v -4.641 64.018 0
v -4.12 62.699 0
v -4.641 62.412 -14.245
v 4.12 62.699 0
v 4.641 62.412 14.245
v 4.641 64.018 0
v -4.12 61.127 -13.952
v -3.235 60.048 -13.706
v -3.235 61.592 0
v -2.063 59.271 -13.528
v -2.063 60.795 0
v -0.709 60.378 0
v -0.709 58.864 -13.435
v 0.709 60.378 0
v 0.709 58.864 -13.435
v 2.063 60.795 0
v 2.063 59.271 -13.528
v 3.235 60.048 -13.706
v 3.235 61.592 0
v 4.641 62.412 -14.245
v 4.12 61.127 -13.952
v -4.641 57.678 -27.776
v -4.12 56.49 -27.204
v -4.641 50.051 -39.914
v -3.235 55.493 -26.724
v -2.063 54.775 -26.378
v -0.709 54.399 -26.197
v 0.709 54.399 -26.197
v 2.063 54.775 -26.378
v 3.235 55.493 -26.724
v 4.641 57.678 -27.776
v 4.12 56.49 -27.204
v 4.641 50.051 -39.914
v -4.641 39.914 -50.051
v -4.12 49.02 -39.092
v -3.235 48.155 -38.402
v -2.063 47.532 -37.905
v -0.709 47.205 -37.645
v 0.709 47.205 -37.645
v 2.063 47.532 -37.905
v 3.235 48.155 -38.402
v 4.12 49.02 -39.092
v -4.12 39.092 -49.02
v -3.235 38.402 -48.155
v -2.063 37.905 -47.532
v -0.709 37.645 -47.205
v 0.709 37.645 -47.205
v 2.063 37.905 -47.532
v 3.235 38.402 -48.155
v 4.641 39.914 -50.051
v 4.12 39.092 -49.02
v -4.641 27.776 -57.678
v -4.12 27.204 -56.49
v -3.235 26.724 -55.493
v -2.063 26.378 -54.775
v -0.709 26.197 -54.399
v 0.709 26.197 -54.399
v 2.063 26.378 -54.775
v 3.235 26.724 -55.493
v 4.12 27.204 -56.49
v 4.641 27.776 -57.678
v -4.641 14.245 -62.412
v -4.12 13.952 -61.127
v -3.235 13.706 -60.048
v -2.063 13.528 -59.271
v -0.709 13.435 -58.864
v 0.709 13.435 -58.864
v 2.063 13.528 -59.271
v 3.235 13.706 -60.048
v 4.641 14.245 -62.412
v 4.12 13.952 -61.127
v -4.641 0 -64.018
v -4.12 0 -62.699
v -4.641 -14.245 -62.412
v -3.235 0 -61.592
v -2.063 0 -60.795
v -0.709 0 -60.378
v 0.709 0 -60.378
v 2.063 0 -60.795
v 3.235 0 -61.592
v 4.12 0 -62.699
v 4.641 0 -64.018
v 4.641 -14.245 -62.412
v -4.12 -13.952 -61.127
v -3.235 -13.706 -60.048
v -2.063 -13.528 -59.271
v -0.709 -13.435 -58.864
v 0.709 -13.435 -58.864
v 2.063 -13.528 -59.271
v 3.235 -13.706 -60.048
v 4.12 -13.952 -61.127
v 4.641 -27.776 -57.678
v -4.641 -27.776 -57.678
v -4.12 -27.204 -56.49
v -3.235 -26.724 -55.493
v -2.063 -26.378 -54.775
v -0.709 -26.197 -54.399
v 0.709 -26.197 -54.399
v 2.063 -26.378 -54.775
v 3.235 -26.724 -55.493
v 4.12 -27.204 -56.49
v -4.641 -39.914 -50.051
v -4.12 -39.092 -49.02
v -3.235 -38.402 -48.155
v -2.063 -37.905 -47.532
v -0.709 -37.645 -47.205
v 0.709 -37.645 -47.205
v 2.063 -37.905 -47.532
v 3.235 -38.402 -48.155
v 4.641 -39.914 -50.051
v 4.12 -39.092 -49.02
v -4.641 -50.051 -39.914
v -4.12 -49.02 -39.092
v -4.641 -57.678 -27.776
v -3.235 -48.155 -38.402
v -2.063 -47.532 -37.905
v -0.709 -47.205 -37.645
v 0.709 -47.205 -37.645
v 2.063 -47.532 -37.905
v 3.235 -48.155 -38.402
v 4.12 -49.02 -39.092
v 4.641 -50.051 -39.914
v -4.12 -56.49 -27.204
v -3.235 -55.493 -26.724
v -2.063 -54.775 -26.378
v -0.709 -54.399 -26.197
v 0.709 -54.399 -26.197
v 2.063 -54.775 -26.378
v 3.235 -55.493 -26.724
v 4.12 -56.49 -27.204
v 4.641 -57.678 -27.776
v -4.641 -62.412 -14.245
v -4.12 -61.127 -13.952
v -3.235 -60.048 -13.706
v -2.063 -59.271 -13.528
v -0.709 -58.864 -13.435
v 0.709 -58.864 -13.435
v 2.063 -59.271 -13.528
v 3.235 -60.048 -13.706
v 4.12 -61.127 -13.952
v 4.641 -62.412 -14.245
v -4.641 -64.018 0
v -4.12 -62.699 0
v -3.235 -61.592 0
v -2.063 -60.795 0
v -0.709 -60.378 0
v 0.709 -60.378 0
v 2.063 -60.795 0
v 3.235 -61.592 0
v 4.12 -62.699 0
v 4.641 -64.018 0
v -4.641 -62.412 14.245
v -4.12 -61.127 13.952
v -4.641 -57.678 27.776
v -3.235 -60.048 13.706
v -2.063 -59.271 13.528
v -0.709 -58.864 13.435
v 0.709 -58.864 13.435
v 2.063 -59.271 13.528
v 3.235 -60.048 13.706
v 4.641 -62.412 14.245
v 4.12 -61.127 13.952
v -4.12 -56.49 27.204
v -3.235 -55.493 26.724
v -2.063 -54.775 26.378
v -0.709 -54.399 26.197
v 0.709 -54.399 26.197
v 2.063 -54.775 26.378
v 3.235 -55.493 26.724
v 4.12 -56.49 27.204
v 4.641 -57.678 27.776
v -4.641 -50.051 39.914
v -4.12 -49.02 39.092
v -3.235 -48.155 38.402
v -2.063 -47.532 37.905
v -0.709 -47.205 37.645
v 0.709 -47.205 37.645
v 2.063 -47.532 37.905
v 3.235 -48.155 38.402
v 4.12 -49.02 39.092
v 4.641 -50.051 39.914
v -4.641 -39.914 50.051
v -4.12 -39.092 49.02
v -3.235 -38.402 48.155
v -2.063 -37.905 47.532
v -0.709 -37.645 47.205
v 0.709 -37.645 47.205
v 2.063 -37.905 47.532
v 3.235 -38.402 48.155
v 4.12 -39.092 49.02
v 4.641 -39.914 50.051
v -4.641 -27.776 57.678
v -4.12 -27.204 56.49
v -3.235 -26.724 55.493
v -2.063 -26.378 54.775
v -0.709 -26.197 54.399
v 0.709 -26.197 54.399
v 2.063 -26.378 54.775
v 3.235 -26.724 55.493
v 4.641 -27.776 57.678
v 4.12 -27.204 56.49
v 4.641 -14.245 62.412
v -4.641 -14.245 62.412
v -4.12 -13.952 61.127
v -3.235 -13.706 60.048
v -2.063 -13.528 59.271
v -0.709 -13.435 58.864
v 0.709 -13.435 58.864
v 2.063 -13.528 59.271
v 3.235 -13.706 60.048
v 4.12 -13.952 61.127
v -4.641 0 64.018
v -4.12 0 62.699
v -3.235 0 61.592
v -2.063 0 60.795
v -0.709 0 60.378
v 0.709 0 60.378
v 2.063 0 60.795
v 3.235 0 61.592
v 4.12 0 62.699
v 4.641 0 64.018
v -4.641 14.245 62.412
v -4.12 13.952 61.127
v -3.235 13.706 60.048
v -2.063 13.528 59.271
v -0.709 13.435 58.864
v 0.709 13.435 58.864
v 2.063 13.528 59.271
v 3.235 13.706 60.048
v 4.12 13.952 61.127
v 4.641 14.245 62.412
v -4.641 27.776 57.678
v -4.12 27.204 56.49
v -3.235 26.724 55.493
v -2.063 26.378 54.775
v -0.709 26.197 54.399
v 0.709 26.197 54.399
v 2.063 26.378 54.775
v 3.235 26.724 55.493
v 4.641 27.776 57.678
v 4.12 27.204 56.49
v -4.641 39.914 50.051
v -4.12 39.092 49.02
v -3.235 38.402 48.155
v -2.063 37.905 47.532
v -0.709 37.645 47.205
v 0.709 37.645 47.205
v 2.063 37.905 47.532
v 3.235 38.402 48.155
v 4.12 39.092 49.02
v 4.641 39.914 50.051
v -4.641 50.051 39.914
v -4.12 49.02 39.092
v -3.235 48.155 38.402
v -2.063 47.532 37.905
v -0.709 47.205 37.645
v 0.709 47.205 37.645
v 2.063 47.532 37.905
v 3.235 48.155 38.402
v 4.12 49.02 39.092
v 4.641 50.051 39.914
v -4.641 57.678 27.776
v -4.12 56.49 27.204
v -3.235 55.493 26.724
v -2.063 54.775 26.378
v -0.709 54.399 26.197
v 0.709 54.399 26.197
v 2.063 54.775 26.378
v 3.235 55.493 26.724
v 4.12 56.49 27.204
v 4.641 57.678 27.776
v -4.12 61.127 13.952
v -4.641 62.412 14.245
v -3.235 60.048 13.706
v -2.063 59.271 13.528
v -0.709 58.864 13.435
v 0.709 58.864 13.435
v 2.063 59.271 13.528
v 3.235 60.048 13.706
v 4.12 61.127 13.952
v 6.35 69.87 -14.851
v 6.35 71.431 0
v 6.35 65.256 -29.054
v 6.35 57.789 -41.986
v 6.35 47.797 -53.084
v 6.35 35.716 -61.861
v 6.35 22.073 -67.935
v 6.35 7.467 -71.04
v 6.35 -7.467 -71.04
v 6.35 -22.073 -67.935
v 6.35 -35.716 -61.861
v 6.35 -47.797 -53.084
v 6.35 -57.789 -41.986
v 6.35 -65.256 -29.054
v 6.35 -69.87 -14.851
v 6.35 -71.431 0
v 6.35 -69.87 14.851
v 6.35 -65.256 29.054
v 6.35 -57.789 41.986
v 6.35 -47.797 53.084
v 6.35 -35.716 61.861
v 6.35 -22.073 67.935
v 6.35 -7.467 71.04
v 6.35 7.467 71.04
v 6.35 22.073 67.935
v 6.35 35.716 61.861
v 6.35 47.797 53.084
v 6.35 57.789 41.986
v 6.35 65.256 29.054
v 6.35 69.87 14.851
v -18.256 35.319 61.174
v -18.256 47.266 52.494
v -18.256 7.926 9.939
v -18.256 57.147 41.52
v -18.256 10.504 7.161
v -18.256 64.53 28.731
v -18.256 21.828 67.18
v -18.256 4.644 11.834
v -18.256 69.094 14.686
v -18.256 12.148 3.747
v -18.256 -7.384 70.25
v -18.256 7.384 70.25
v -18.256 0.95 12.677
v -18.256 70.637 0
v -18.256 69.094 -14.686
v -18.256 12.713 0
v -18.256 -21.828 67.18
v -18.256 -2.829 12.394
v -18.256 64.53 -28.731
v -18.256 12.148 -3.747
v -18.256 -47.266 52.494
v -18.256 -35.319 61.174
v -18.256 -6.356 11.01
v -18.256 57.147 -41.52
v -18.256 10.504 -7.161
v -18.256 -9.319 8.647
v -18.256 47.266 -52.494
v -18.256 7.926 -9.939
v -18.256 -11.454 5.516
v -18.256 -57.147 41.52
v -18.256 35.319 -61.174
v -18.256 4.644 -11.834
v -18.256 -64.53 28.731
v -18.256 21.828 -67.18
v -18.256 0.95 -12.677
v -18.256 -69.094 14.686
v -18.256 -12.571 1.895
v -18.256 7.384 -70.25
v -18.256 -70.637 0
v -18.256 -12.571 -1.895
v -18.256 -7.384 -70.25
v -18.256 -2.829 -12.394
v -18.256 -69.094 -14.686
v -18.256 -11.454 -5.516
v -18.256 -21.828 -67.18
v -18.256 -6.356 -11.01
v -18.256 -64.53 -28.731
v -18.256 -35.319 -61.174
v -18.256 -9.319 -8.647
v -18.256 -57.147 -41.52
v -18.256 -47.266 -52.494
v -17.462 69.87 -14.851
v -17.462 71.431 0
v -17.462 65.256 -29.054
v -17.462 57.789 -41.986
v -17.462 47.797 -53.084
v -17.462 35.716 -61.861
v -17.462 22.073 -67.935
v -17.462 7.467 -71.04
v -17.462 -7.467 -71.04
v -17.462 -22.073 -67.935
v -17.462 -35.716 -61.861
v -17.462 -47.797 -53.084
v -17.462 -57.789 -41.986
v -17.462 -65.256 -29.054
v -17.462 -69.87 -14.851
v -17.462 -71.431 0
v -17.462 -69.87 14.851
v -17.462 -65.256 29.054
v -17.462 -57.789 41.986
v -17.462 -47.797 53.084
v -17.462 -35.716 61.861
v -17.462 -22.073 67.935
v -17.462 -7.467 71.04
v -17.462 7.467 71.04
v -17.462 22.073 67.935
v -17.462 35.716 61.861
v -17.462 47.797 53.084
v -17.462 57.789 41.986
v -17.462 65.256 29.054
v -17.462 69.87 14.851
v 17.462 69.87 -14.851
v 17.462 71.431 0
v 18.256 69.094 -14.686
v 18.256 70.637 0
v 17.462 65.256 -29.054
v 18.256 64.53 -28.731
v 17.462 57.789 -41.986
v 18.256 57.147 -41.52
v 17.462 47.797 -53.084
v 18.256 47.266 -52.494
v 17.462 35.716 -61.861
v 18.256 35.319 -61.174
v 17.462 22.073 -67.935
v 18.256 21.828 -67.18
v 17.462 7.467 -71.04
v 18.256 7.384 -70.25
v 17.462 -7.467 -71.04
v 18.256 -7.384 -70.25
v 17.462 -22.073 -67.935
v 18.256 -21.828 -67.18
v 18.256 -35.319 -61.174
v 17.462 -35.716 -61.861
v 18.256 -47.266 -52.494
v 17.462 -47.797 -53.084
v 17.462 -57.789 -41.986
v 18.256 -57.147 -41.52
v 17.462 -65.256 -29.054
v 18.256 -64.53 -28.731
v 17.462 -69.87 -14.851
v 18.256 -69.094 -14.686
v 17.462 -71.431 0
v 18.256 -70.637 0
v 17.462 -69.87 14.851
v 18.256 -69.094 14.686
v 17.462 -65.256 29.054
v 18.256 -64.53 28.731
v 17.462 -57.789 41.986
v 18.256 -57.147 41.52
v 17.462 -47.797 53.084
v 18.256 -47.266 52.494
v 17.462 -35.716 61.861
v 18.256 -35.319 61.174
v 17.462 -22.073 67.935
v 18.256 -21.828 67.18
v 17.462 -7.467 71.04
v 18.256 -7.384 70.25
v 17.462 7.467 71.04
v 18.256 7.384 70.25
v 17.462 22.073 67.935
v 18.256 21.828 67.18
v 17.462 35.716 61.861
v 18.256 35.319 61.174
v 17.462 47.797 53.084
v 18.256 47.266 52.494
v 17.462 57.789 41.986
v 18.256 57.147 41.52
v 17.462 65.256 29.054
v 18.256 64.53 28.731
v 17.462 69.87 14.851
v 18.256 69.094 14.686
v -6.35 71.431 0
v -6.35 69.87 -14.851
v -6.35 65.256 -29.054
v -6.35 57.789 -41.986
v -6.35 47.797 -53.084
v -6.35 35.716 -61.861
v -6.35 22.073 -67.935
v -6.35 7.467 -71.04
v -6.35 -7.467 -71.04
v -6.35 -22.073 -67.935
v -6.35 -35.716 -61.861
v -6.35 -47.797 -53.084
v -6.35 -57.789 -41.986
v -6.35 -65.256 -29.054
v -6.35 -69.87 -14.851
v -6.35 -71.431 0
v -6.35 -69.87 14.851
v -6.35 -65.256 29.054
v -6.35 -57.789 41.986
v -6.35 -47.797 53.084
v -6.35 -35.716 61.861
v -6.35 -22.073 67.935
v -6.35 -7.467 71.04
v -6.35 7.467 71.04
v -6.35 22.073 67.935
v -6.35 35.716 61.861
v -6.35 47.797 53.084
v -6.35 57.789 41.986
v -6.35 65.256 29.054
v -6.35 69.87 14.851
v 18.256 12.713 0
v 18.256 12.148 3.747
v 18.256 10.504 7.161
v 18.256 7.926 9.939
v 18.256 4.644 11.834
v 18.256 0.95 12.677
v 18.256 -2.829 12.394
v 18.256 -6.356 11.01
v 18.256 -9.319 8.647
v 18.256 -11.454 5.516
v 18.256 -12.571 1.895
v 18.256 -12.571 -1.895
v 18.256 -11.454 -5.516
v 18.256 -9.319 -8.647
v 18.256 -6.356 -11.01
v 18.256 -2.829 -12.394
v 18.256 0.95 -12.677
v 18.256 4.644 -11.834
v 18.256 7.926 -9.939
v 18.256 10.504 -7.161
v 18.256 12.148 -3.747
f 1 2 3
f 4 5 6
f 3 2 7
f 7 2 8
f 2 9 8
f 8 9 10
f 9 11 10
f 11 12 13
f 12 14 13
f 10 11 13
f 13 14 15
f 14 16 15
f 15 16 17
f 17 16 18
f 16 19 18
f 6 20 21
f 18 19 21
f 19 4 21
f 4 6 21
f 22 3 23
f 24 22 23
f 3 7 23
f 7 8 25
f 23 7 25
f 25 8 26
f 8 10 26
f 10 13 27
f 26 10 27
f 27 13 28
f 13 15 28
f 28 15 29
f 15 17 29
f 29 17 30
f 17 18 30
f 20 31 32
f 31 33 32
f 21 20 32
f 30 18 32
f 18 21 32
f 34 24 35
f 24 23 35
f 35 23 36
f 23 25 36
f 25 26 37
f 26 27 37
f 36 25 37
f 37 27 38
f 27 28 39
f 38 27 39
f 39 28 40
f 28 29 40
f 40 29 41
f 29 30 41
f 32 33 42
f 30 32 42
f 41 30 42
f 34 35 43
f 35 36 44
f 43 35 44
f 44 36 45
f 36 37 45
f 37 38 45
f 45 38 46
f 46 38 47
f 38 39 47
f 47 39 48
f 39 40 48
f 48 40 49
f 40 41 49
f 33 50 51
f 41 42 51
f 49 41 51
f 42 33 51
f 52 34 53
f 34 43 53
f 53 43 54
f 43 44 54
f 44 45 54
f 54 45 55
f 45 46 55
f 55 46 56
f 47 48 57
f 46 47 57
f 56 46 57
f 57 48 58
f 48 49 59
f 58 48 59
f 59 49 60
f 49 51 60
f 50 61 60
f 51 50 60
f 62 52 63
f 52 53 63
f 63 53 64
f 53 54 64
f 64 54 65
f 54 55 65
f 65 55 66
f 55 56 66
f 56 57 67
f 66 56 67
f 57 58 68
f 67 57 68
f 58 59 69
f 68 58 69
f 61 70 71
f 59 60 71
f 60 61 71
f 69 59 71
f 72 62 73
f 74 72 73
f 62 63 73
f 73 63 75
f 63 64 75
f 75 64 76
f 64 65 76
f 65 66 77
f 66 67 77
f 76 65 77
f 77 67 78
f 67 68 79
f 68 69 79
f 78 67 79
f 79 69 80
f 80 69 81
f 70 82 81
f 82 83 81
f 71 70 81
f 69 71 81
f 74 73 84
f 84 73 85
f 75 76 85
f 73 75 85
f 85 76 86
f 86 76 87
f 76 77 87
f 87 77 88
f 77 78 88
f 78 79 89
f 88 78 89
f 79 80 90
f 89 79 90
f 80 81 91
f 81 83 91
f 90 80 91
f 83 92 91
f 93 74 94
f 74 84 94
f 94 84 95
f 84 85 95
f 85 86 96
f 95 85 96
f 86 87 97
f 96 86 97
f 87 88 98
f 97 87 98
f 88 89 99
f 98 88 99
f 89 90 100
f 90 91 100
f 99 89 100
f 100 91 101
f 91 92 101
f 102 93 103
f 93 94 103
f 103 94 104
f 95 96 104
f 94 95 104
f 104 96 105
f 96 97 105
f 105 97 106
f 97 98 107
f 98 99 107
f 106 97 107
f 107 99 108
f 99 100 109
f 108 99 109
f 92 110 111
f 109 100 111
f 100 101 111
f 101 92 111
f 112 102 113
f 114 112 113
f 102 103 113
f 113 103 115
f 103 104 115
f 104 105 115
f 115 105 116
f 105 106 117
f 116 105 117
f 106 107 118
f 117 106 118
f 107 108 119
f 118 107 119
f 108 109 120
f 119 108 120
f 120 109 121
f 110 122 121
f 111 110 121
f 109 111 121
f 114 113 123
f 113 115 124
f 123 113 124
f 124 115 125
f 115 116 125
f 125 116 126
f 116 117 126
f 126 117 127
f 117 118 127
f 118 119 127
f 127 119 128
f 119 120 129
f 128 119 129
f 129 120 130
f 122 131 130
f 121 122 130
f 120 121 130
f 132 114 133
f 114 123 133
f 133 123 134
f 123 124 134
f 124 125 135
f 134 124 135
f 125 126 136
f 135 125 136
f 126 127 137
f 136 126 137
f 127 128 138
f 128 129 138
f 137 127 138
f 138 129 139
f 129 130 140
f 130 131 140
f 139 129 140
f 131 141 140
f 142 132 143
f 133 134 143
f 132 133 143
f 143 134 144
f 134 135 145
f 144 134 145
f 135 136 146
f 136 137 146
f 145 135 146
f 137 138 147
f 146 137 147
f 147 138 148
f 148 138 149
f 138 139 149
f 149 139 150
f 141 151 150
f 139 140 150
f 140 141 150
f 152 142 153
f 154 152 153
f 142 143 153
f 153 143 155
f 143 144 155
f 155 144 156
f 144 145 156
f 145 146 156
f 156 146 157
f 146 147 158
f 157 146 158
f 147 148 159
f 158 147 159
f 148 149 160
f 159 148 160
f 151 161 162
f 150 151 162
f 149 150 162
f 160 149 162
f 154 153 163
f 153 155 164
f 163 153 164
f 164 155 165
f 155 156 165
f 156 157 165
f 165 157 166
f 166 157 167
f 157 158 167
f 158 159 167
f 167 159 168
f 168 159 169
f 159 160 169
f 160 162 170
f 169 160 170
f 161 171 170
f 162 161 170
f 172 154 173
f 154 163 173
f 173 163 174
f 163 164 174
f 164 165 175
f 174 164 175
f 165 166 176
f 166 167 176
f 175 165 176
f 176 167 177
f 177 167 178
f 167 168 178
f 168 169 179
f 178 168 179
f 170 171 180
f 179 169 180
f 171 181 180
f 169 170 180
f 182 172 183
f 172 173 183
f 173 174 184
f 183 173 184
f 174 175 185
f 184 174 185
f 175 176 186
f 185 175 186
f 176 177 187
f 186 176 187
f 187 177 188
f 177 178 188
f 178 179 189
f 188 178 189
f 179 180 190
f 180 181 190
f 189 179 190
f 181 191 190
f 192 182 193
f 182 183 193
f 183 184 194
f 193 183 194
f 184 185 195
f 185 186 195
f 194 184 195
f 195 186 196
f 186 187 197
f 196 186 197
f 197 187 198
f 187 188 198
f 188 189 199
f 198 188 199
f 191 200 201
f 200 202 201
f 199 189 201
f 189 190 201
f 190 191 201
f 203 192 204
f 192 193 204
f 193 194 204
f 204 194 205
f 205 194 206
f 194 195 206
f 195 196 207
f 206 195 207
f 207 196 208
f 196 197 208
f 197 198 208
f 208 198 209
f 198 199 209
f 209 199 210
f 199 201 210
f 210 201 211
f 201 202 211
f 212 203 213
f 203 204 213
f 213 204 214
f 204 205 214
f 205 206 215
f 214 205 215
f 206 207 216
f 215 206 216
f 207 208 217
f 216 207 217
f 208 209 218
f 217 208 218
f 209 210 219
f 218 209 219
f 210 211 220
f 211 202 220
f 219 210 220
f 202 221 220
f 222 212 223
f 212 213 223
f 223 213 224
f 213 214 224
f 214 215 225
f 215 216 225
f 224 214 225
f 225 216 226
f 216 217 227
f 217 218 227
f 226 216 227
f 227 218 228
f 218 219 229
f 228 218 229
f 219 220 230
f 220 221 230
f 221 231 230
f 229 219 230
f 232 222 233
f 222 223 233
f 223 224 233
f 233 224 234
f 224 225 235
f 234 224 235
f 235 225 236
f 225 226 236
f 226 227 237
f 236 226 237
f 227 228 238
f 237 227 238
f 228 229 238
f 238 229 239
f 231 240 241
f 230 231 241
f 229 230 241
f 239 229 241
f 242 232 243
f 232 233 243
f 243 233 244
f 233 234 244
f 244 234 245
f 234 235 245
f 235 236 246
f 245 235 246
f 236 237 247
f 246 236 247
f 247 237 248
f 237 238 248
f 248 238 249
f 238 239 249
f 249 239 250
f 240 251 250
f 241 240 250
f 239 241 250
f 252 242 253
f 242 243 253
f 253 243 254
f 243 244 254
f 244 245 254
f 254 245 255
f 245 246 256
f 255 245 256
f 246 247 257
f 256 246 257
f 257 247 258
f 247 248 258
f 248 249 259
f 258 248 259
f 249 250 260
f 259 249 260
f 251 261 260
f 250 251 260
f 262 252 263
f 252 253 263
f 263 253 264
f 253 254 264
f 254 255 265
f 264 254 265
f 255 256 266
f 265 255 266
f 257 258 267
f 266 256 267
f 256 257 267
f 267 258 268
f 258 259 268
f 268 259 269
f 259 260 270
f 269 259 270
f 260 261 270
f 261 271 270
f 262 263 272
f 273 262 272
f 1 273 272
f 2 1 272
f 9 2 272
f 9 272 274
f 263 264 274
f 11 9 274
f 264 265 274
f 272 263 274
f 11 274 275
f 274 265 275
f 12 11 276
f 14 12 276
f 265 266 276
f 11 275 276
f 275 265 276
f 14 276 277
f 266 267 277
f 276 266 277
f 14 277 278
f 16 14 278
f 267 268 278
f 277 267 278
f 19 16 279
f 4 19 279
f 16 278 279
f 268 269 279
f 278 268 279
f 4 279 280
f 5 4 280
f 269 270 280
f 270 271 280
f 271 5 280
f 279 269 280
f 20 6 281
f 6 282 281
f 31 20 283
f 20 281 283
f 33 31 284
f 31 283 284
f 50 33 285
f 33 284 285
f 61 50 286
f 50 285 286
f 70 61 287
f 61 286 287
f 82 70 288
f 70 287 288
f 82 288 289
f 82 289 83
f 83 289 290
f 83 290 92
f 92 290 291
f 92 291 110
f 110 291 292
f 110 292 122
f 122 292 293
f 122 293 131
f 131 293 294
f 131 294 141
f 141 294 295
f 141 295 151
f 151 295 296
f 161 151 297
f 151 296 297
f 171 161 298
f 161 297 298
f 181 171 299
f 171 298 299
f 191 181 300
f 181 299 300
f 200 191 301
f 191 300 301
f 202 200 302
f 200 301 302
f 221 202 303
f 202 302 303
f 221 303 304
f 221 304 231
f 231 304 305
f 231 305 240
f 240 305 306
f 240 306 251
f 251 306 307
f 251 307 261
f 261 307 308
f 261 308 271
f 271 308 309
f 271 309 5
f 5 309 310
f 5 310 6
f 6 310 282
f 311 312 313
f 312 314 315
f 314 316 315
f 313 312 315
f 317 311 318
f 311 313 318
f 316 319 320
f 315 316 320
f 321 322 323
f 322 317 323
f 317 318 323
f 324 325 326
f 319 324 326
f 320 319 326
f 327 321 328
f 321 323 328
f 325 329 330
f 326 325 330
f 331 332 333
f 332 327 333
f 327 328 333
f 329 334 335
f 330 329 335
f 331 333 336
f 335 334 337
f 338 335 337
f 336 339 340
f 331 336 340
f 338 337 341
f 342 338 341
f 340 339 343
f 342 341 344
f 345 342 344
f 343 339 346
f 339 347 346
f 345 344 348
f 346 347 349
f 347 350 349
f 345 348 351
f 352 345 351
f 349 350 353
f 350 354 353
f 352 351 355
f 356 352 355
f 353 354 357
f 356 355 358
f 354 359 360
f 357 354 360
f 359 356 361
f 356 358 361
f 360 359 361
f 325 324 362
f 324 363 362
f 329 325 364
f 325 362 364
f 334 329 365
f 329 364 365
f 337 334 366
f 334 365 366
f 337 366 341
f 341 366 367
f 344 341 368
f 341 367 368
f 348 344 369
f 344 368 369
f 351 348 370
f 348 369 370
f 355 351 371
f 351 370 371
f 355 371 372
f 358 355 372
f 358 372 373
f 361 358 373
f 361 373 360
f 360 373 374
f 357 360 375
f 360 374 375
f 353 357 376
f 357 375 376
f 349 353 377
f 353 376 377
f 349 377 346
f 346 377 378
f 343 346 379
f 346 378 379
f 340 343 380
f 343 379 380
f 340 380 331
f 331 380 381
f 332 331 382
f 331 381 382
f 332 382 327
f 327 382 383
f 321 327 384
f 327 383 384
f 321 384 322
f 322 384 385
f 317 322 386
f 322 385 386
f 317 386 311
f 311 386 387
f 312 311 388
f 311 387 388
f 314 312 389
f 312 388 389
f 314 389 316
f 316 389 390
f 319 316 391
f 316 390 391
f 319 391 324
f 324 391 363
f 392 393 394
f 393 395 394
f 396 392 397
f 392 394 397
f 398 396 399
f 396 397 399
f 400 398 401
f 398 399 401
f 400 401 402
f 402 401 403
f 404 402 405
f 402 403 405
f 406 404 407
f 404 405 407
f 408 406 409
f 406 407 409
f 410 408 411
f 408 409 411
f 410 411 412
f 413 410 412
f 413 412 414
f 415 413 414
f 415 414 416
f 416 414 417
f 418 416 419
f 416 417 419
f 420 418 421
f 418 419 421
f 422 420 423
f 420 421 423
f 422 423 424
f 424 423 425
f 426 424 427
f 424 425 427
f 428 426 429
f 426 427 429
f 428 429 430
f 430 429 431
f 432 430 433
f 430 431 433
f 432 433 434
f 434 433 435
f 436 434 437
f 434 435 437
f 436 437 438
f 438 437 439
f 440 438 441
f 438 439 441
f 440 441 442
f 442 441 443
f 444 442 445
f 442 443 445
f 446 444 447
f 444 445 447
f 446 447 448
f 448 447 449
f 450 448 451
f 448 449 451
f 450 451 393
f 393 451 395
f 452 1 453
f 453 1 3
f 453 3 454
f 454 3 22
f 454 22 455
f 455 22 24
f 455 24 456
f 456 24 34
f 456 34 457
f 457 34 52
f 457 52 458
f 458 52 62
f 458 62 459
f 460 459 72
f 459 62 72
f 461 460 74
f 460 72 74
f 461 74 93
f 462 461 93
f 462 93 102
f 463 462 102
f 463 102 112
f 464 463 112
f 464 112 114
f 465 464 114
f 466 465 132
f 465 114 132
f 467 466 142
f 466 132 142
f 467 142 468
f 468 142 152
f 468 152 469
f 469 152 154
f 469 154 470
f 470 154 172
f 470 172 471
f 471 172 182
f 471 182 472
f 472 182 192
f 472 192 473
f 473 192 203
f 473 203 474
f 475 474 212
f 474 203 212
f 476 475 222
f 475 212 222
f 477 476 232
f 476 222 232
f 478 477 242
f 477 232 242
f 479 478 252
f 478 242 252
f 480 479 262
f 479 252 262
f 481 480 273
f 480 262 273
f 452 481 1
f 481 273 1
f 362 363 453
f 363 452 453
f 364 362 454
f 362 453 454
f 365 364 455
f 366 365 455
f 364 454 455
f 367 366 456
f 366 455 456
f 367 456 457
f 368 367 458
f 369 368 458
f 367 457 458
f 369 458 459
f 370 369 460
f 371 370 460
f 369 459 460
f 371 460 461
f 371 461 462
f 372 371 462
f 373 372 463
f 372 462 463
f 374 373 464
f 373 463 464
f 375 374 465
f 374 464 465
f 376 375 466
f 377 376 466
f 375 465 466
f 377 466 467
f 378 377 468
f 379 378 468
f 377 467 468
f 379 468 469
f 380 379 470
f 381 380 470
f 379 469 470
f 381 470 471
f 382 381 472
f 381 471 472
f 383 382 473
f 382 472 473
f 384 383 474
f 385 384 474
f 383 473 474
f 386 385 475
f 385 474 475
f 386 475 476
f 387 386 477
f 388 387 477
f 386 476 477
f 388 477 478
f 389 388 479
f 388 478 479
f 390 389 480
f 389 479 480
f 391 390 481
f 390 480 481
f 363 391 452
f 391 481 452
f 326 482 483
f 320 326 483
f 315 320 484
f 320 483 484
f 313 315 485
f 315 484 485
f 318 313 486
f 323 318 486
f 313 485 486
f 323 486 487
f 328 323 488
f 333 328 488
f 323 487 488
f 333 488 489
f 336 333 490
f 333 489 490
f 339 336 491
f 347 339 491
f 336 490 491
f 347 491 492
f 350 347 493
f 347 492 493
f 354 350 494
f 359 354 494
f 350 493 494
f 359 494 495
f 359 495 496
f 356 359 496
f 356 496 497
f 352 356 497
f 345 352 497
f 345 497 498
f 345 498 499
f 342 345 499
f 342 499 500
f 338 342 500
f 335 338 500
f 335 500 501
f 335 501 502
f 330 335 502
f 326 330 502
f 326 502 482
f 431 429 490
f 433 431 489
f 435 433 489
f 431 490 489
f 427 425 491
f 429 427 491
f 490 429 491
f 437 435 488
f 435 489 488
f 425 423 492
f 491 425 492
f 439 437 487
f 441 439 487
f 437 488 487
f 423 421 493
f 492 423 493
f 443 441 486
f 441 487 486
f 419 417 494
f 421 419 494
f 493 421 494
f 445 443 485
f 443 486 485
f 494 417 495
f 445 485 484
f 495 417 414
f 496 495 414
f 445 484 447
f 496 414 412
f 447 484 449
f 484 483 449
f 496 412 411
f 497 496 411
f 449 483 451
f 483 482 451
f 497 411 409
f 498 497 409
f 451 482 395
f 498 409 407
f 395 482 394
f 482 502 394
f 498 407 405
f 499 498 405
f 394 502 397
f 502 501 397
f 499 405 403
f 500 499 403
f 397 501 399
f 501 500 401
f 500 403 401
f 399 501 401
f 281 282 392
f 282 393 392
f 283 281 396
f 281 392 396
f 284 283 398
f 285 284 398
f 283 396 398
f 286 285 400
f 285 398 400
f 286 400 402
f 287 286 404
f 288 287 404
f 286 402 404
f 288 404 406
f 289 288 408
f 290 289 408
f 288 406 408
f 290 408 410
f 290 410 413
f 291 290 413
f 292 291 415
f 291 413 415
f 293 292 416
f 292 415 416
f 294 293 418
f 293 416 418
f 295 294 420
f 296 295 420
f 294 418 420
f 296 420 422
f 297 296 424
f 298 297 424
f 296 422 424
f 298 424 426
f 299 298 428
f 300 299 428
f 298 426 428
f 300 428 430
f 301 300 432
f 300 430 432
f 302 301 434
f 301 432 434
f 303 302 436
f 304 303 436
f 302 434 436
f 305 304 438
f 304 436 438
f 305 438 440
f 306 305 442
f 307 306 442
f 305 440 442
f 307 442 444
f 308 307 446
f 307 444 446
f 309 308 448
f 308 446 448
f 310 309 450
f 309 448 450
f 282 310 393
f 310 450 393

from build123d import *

# Parameters (mm, degrees)
SKETCH2_R          = 12.7127
CUT_EXTRUDE1_DEPTH = 37.5125


with BuildPart() as part:
    # Sketch1 → Revolve1 (revolve)
    with BuildSketch(Plane.XY):
        with BuildLine():
            Line((18.25625, 0), (-18.25625, 0))
            Line((-18.25625, 0), (-18.25625, 70.6374))
            Line((-18.25625, 70.6374), (-17.4625, 71.43115))
            Line((-17.4625, 71.43115), (-6.35, 71.43115))
            Line((-6.35, 71.43115), (-4.640755559, 64.017549491))
            ThreePointArc((-4.640755559, 64.017549491), (0, 60.325), (4.640755559, 64.017549491))
            Line((4.640755559, 64.017549491), (6.35, 71.43115))
            Line((6.35, 71.43115), (17.4625, 71.43115))
            Line((17.4625, 71.43115), (18.25625, 70.6374))
            Line((18.25625, 70.6374), (18.25625, 0))
        make_face()
    revolve(axis=Axis((18.25625, 0, 0), (-1, 0, 0)))

    # Sketch2 → Cut-Extrude1 (cut, through all)
    with BuildSketch(Plane(origin=(18.25625, 0, 0), x_dir=(0, 0, -1), z_dir=(1, 0, 0))):
        with Locations(Location((0, 0, 0), (0, 0, 90))):  # turned: the seam where the file's is
            Circle(SKETCH2_R)
    extrude(amount=-CUT_EXTRUDE1_DEPTH, mode=Mode.SUBTRACT)


solid = part.part
